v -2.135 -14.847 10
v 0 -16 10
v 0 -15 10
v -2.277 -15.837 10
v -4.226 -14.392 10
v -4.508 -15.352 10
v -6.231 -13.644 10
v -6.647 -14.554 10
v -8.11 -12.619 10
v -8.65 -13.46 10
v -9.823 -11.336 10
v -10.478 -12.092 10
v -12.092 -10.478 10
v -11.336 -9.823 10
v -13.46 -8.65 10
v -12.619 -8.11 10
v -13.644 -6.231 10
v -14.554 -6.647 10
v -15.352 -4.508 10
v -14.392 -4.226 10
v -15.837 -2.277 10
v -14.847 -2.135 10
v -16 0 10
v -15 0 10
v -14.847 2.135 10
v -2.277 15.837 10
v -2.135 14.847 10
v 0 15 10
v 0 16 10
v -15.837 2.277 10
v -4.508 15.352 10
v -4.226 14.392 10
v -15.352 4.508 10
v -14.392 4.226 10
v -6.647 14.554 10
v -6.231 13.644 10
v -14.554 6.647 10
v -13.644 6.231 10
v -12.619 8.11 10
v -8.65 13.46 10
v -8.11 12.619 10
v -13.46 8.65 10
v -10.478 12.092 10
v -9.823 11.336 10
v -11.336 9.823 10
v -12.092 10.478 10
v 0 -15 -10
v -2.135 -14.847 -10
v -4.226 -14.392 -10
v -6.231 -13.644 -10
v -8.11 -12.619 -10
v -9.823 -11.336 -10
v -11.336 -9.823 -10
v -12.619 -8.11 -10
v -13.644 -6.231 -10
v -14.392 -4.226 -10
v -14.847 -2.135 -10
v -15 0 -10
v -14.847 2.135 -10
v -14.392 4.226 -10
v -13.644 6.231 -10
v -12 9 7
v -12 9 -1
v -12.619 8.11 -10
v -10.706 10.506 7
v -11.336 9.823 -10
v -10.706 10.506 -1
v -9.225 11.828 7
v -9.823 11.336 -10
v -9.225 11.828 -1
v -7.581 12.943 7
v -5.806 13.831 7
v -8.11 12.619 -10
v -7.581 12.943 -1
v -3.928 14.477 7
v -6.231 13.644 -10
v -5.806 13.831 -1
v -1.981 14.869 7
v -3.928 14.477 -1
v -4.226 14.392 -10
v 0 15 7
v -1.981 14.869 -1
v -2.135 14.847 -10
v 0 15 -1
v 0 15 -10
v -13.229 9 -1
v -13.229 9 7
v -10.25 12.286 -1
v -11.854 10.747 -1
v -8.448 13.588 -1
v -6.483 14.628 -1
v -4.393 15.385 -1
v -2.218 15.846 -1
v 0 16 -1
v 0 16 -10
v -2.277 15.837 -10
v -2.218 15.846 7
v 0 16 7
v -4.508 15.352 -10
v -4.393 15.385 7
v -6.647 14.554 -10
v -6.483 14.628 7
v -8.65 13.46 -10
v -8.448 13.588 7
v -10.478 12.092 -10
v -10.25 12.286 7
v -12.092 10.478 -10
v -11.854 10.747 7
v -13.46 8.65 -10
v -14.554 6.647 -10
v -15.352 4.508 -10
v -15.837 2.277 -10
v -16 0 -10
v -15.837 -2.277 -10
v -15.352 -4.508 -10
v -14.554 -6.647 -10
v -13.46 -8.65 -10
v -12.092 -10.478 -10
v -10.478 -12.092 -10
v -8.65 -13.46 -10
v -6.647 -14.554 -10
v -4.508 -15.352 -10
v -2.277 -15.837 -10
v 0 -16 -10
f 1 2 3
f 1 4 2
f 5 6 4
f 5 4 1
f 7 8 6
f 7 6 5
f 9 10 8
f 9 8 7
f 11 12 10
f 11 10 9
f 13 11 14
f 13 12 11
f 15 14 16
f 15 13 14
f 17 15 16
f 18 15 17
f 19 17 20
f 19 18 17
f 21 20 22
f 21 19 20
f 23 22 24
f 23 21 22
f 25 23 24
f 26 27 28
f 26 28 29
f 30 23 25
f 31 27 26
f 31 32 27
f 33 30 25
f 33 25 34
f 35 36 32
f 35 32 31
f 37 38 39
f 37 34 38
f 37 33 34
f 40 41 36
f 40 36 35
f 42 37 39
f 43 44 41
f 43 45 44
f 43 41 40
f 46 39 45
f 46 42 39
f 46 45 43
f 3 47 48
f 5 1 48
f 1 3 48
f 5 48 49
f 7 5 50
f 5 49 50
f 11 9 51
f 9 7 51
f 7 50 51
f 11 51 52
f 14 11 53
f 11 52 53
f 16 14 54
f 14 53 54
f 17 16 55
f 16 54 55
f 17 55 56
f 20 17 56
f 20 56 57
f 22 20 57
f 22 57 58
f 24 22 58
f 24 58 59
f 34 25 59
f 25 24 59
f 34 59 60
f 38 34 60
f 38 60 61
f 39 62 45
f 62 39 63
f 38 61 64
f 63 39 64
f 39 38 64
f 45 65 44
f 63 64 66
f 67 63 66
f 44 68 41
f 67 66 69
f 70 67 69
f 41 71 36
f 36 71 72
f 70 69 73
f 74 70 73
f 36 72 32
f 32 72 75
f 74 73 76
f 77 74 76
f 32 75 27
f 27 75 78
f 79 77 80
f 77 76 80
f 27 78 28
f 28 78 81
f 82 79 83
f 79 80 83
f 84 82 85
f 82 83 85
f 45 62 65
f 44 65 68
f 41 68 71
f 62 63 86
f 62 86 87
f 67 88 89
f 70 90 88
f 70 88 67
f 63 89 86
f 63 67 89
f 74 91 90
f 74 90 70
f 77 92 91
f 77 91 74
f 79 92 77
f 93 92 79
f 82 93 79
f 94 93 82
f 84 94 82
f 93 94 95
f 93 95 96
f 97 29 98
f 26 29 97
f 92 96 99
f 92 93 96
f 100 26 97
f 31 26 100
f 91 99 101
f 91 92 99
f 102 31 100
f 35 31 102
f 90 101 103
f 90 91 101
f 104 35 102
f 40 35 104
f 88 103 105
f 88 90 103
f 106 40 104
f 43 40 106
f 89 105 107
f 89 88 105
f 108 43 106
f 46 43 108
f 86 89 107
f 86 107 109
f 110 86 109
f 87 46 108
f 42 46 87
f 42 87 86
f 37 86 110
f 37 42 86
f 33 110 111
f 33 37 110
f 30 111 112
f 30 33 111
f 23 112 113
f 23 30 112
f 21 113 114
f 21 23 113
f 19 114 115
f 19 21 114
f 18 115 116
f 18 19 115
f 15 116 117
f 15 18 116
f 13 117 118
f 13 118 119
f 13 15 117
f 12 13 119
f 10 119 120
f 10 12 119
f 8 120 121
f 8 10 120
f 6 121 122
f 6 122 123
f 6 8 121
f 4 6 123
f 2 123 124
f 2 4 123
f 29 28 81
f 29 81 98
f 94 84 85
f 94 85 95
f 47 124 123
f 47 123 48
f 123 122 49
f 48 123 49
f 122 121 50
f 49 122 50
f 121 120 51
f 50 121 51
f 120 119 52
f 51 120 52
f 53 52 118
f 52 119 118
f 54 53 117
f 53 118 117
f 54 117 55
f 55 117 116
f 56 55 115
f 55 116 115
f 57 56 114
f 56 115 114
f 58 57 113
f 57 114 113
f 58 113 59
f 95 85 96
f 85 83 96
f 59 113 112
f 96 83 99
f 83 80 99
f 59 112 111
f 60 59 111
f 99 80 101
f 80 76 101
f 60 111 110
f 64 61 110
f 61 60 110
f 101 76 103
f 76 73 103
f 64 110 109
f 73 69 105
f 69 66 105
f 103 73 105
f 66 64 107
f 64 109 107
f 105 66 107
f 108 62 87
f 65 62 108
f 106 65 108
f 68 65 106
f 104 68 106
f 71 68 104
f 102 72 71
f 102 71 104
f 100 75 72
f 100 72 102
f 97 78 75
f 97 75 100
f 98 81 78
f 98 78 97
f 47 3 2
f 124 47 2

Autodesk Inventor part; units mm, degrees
ref_plane "YZ Plane" through (0, 0, 0) normal (1, 0, 0) x (0, 1, 0)
ref_plane "XZ Plane" through (0, 0, 0) normal (0, 1, 0) x (-1, 0, 0)
ref_plane "XY Plane" through (0, 0, 0) normal (0, 0, 1) x (1, 0, 0)
sketch "スケッチ1" plane through (0, 0, 0) normal (1, 0, 0) x (0, 1, 0)
  line L0 (0, 0) -> (15, 0) construction
  line L1 (15, 0) -> (15, -10) construction
  line L2 (15, -10) -> (16, -10)
  line L3 (16, -10) -> (16, 10)
  line L4 (16, 10) -> (15, 10)
  line L5 (15, 10) -> (15, -10)
  line L6 (0, -14) -> (0, 14) projected
  dimension "d0" = 15
  dimension "d2" = 1
  dimension "d3" = 20
revolve "回転1" add sketch "スケッチ1" angle 180 about axis through (0, 0, -10) along (0, 0, 1)
sketch "スケッチ2" plane through (0, 15, 10) normal (1, 0, 0) x (0, 0, -1)
  line L0 (20, 1) -> (0, 1) projected
  line L1 (0, 1) -> (3, 1)
  line L2 (3, 1) -> (11, 1)
  line L3 (11, 1) -> (11, -6)
  line L4 (11, -6) -> (3, -6)
  line L5 (3, -6) -> (3, 1)
  point P0 (10, -15)
  dimension "d6" = 8
  dimension "d7" = 7
extrude "押し出し1" cut sketch "スケッチ2" against normal through all
properties part number "cover-pipe" material "ステンレス鋼"
